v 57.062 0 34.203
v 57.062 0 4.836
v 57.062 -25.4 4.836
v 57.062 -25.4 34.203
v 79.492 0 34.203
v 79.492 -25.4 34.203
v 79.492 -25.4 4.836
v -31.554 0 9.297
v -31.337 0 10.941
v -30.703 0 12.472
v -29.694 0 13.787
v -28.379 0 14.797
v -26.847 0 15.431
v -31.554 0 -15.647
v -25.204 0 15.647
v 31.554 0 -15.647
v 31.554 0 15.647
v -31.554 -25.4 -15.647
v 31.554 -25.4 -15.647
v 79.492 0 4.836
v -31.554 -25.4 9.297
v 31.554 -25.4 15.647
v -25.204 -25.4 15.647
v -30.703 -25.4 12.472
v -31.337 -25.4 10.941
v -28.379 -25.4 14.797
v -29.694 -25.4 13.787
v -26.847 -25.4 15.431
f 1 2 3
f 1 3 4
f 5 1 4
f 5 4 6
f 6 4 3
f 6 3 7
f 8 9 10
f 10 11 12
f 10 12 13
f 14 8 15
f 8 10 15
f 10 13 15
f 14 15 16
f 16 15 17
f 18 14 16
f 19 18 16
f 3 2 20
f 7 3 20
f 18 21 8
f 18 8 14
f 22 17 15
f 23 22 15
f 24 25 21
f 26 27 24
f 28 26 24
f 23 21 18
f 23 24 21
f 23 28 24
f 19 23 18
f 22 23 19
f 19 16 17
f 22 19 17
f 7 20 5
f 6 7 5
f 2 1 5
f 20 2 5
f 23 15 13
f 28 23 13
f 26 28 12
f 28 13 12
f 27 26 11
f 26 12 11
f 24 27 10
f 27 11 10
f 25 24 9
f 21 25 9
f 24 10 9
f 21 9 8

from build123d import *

# Parameters (mm, degrees)
F0_W     = 22.430179
F0_H     = 29.366997
F1_DEPTH = 25.4


with BuildPart() as f1:
    # F0 (on Front) → F1 (new body)
    with BuildSketch(Plane.XZ):
        with BuildLine():
            Line((31.553846, -15.647309), (31.553846, 15.647309))
            Line((31.553846, 15.647309), (-25.203846, 15.647309))
            ThreePointArc((-25.203846, 15.647309), (-29.693974, 13.787437), (-31.553846, 9.297309))
            Line((-31.553846, 9.297309), (-31.553846, -15.647309))
            Line((-31.553846, -15.647309), (31.553846, -15.647309))
        make_face()
        with Locations((68.276982, 19.519849)):
            Rectangle(F0_W, F0_H)
    extrude(amount=F1_DEPTH)


solid = f1.part
